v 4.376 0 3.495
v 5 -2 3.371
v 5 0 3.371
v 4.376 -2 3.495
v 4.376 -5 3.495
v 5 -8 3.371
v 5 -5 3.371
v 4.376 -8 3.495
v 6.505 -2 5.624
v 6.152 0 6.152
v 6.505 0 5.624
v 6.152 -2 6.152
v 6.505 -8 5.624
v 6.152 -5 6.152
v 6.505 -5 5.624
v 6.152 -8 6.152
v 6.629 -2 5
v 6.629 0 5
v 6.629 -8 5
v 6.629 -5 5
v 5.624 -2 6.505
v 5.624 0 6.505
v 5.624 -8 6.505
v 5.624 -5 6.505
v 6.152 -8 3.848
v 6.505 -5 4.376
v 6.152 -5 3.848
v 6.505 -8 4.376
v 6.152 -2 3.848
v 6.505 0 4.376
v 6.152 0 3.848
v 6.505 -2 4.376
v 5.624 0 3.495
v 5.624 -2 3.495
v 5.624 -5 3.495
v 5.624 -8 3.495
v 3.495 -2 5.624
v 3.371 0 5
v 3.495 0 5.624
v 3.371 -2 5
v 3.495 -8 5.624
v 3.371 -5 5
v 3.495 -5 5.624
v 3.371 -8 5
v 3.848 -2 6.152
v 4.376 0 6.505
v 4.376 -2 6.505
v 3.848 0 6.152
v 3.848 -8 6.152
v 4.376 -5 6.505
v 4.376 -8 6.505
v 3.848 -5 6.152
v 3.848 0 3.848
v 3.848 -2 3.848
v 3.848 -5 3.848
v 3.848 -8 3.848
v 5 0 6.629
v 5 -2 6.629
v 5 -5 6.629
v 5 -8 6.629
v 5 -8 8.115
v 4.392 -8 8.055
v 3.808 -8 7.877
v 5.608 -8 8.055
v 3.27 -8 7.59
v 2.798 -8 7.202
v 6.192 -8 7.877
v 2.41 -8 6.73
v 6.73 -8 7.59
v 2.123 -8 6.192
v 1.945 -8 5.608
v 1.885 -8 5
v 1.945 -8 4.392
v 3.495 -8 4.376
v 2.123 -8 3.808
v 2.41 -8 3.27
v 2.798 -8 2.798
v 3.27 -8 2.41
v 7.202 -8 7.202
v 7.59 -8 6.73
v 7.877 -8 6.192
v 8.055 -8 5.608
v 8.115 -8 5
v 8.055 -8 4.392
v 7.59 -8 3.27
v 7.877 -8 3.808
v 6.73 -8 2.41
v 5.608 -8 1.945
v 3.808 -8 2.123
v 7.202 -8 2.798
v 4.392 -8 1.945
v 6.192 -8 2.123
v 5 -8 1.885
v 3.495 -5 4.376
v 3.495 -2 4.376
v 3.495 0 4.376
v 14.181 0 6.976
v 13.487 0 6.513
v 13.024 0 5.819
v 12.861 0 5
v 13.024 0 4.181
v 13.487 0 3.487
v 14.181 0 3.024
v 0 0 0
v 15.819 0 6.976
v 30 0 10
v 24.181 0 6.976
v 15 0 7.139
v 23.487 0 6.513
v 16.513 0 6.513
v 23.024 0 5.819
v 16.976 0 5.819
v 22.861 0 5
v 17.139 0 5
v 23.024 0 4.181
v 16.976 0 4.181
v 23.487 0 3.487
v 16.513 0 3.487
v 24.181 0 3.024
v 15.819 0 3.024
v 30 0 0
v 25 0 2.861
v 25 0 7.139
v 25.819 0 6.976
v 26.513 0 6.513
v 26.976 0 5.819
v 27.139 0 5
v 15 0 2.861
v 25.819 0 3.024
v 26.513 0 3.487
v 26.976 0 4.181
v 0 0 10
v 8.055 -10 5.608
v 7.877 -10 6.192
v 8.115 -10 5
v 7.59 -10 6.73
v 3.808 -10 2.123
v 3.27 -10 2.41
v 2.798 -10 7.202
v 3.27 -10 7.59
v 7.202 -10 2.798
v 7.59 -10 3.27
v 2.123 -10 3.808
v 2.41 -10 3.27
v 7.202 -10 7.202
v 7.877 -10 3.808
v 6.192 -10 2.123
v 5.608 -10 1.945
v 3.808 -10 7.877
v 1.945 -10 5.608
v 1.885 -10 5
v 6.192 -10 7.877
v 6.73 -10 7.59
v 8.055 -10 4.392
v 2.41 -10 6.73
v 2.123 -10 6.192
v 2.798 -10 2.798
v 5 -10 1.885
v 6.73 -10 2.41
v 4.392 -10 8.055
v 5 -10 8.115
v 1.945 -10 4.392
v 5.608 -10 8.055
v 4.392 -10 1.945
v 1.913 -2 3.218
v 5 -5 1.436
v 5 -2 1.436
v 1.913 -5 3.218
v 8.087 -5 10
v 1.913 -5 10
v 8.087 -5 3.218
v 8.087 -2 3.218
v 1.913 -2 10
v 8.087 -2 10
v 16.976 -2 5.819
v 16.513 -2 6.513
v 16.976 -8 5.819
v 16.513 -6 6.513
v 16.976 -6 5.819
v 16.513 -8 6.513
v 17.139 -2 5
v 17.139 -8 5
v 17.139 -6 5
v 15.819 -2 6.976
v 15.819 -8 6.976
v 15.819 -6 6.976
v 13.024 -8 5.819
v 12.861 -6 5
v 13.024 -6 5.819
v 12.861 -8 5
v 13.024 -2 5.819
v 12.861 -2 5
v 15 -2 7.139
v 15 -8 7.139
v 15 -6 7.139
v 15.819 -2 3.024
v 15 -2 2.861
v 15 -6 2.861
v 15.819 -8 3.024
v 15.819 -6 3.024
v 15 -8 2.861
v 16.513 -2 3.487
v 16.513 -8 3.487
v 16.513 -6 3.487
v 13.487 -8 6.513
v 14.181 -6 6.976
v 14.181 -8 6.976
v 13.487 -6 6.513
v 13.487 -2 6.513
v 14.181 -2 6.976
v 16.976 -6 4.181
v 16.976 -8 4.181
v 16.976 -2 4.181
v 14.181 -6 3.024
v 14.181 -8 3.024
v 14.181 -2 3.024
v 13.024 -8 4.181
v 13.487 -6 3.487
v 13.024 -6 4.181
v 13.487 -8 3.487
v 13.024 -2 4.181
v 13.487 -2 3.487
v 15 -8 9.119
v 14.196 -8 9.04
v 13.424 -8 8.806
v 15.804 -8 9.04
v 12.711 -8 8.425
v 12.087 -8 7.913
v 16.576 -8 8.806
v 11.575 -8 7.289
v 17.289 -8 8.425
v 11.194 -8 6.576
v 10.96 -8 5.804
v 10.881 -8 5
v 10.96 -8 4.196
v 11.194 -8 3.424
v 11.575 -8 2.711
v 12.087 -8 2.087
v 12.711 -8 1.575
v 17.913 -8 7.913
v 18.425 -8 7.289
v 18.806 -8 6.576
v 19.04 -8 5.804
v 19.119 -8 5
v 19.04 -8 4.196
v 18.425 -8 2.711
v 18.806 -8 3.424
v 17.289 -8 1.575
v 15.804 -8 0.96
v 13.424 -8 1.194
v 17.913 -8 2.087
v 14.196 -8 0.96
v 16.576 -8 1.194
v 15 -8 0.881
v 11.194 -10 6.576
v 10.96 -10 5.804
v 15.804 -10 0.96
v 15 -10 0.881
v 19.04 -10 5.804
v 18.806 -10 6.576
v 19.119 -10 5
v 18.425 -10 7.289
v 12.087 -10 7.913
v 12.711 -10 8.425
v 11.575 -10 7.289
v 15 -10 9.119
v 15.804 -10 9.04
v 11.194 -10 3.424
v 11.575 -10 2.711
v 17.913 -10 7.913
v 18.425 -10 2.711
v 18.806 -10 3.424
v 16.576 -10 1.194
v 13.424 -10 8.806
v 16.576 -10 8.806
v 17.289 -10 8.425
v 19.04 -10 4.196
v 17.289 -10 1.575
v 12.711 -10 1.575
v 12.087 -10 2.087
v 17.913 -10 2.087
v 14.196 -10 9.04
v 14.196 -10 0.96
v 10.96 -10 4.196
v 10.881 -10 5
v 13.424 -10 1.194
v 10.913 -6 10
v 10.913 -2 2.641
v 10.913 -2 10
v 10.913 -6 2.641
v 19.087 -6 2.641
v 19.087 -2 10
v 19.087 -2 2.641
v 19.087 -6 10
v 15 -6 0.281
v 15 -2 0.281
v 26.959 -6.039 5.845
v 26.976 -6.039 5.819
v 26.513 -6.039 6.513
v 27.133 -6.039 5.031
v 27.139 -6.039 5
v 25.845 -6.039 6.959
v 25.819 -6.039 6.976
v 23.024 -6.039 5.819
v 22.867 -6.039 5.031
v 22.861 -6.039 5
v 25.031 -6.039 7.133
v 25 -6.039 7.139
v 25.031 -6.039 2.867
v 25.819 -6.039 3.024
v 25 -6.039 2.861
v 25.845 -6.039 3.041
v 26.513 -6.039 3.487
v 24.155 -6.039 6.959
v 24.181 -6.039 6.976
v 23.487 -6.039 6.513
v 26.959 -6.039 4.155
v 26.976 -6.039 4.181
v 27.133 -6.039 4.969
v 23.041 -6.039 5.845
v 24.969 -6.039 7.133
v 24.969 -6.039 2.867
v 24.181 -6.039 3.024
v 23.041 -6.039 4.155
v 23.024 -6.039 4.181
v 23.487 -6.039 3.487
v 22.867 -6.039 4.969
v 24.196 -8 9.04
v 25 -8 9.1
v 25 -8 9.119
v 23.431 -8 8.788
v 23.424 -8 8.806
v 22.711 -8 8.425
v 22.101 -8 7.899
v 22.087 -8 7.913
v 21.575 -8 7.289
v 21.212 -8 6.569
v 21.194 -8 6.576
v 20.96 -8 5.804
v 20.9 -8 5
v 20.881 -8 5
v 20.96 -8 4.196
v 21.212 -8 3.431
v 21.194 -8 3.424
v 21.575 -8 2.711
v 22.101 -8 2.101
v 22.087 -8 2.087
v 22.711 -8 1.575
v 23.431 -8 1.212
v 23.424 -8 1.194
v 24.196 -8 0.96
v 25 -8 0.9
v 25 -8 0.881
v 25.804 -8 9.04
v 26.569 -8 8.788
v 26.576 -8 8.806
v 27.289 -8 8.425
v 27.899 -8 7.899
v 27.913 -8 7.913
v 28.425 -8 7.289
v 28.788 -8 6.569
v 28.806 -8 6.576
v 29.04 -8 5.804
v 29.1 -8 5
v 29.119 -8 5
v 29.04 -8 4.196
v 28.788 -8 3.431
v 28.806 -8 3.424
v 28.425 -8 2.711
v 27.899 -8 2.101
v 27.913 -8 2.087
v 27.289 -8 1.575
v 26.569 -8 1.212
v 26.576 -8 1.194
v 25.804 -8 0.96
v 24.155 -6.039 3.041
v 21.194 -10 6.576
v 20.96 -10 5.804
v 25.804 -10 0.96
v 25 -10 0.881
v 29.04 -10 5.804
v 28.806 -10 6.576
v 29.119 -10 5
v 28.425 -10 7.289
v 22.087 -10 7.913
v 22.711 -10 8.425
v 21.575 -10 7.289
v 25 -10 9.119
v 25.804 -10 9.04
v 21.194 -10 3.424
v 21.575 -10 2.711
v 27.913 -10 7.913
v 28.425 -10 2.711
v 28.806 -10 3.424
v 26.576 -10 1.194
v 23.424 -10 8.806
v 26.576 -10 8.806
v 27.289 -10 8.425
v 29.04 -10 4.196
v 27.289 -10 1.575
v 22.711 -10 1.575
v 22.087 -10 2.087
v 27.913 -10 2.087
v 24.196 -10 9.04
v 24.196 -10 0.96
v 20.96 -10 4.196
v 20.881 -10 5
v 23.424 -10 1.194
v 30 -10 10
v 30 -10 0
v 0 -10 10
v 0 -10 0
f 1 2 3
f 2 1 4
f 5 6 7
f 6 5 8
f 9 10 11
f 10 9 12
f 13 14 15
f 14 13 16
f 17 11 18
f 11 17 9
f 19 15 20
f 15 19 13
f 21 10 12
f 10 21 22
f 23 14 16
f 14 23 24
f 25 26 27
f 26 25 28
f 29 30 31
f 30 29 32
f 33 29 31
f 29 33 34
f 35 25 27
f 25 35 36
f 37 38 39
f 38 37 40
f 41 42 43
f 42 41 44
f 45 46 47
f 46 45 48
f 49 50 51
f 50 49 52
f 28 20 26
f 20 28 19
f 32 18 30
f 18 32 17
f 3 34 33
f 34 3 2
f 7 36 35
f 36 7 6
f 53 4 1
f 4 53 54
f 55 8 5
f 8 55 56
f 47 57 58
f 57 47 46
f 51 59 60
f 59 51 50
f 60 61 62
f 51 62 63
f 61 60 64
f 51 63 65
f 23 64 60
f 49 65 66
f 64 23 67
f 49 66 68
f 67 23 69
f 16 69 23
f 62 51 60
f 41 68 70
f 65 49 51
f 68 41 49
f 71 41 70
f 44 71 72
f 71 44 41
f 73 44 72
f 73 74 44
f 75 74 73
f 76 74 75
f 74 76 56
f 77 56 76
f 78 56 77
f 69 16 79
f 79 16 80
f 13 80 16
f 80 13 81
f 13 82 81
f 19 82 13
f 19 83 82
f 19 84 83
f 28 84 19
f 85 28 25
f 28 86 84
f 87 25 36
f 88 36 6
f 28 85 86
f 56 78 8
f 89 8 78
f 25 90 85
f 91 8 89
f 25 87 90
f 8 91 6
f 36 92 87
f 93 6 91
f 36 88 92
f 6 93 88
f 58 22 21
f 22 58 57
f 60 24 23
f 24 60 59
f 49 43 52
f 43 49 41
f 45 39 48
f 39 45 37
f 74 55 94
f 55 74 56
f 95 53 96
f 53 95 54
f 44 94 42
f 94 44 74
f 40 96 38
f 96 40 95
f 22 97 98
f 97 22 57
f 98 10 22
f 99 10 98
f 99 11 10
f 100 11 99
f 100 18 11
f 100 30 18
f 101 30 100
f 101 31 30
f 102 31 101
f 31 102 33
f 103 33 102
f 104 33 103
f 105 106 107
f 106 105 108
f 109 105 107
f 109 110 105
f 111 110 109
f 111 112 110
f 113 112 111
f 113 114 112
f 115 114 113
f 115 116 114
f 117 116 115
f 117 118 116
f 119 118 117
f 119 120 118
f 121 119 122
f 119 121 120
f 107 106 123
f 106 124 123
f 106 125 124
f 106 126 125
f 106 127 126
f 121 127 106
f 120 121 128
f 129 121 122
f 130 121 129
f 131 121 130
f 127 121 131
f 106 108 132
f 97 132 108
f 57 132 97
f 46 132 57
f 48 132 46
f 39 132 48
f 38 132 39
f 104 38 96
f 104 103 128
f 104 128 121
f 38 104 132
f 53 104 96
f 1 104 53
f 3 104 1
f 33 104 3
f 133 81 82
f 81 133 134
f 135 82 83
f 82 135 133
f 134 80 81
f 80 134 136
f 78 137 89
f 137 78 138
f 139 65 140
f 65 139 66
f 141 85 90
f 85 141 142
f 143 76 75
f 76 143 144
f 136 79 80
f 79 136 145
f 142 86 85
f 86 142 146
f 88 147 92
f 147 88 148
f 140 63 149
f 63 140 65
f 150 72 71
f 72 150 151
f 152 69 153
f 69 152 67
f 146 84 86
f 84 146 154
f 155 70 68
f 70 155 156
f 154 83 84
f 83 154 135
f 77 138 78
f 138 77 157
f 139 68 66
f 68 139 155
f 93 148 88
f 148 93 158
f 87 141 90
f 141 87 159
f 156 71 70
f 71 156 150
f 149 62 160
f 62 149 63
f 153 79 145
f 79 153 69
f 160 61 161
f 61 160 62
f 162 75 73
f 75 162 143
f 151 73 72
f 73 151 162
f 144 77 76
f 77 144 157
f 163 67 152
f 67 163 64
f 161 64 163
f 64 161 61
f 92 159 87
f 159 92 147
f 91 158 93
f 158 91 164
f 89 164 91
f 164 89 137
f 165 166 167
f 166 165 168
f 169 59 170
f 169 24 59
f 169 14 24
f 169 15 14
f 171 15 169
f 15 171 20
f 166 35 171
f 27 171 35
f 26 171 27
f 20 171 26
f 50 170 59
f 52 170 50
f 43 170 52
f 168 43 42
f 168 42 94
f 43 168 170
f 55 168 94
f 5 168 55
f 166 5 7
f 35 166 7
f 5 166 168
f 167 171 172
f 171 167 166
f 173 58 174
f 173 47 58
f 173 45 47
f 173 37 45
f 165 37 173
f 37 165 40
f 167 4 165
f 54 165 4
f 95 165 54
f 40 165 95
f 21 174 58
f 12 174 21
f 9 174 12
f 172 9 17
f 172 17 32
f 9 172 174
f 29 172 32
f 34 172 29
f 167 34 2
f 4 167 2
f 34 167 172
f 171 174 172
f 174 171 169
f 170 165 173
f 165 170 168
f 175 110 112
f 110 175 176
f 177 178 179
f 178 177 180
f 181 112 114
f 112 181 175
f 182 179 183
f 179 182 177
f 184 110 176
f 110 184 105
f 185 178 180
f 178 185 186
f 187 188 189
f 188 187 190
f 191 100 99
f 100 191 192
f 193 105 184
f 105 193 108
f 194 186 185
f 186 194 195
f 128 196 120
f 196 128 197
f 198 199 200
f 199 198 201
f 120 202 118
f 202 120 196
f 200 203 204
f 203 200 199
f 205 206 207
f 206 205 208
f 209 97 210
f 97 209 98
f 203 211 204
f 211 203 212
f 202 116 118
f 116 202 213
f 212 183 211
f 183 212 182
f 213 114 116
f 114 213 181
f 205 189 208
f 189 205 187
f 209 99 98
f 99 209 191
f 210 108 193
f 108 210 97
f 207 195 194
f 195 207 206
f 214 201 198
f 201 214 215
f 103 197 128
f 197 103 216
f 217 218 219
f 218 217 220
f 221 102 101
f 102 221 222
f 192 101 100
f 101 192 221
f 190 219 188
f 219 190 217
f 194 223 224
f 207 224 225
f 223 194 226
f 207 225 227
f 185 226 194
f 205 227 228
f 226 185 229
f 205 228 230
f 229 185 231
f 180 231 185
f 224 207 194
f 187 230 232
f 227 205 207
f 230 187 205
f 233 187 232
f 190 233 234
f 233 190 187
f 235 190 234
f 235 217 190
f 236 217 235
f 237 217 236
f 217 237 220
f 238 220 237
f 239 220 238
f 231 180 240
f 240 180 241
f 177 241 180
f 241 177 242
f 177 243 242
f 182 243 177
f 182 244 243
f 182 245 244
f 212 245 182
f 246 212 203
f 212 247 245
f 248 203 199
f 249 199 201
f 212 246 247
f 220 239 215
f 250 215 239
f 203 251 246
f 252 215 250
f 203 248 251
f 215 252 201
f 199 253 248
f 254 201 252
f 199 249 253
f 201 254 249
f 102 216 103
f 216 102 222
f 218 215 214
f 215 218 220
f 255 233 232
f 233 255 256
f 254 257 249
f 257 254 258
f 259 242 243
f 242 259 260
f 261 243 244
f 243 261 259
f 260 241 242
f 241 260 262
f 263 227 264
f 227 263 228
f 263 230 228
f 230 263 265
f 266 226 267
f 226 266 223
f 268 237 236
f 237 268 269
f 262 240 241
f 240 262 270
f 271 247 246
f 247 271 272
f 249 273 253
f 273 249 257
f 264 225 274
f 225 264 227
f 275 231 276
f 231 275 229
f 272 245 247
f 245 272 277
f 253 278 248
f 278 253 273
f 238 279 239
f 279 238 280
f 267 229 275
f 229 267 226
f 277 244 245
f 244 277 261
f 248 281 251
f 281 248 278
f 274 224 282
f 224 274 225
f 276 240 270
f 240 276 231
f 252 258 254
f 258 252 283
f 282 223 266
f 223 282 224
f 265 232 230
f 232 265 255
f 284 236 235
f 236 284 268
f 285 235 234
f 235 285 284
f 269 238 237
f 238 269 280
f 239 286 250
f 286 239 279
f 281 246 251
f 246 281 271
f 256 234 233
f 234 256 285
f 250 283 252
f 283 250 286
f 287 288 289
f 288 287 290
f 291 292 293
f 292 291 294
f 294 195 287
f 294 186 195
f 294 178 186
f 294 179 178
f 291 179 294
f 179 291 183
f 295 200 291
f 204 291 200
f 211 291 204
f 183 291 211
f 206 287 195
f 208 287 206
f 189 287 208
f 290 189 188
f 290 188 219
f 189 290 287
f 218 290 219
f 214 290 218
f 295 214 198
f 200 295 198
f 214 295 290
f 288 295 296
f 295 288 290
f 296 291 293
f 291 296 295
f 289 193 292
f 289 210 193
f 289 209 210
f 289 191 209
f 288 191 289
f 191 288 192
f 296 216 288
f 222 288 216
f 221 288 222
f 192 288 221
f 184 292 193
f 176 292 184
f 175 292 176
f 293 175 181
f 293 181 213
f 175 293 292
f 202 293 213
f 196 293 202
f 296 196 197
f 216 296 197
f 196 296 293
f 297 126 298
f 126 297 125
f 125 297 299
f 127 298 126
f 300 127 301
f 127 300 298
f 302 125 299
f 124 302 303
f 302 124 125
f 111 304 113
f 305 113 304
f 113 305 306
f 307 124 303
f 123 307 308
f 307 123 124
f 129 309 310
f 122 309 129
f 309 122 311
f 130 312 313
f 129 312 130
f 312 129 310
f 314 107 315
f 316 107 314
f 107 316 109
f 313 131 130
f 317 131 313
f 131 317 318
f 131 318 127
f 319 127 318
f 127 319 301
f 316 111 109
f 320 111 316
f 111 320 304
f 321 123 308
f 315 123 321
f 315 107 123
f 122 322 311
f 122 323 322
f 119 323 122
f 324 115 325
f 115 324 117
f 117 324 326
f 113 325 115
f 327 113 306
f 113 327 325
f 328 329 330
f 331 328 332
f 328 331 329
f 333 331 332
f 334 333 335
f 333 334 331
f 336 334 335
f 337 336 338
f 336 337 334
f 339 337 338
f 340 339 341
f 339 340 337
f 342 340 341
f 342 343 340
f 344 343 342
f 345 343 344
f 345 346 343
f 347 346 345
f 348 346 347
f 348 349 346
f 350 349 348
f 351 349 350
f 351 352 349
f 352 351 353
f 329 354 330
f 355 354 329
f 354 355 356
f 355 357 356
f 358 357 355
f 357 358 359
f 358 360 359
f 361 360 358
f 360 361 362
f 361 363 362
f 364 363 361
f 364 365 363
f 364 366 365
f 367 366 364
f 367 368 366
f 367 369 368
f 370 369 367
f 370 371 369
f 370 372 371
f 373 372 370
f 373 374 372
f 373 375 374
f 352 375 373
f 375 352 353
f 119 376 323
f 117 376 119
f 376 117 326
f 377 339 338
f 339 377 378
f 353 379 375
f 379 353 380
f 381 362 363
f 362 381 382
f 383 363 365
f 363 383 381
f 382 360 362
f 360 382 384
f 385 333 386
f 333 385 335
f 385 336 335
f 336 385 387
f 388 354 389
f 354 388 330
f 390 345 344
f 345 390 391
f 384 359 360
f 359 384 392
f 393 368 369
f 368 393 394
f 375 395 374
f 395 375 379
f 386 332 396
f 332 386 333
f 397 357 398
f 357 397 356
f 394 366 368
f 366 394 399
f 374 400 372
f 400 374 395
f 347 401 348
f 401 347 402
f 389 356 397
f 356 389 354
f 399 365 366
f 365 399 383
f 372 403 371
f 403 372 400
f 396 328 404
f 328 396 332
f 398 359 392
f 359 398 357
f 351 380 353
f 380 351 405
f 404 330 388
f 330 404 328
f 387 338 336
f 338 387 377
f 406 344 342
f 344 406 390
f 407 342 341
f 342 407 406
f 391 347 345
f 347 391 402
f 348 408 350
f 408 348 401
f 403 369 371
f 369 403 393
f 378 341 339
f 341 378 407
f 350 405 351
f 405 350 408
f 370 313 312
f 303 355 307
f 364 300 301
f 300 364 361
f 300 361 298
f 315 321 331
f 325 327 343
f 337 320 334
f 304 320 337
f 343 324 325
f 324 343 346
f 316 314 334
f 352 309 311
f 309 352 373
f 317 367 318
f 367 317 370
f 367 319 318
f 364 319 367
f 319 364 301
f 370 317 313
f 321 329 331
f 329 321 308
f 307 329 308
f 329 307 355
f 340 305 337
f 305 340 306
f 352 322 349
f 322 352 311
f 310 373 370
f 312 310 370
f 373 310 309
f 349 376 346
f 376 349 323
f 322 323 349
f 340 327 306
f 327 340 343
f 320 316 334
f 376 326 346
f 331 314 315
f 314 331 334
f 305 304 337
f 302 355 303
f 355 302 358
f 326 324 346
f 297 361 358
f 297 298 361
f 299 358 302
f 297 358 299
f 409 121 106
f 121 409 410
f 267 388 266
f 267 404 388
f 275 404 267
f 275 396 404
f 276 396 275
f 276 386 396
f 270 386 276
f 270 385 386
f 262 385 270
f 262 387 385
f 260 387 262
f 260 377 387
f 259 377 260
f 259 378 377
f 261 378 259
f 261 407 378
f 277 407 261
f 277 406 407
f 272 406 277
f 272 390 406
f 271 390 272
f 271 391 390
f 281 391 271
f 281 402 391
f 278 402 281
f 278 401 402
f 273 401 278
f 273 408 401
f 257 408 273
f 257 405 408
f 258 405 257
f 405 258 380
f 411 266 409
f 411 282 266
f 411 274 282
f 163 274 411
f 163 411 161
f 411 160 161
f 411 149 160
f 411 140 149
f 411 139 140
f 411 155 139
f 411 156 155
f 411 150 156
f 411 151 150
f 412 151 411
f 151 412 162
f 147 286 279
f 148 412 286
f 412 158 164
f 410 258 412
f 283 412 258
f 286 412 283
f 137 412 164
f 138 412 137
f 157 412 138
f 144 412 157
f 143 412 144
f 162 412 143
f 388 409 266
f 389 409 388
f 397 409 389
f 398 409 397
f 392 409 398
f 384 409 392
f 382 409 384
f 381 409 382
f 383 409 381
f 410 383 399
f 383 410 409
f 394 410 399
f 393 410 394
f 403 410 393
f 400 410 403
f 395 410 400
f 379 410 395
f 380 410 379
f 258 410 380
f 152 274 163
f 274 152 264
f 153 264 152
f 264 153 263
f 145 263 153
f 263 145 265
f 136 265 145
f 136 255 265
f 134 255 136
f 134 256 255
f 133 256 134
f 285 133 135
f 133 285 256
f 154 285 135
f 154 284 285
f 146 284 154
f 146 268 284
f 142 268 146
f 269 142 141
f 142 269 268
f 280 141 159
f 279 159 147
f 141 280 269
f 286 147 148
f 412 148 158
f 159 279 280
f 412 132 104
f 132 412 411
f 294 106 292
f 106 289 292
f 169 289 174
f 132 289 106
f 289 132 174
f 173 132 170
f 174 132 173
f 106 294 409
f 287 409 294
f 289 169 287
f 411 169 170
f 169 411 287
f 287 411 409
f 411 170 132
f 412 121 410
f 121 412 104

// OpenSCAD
$radial_error = 0.1;
$fn = 16;

// This is for making holes.
module cylinder_outer(height, radius, fn=$fn) {
	fudge = 1/cos(180/fn);
	cylinder(h=height,r=radius*fudge+$radial_error, $fn=fn);
}

// This is for making things that fit in holes.
module cylinder_inner(height, radius, fn=$fn) {
	cylinder(h=height,r=radius-$radial_error,$fn=fn);
}

// Make a hole for a bolt/screw combination.
module bolt(diameter=3, depth=8, nut_offset=2, shaft_length=10, inset=10) {
	hole(diameter, depth, inset);
	hull() {
		shaft_width = diameter;
		translate([0, 0, nut_offset]) rotate(360/12, [0, 0, 1]) cylinder_outer(diameter, shaft_width, 6);
		translate([0, shaft_length, nut_offset]) rotate(360/12, [0, 0, 1]) cylinder_outer(diameter, shaft_width, 6);
	}
}

// Make a hole. The diameter is the size of the screw (e.g. 3 for M3). Depth is how far the hole should go for the thread, and inset is how far out there should be a hole for the head to go.
module hole(diameter=3, depth=6, inset=10) {
	cylinder_outer(depth, diameter/2);
	translate([0, 0, depth]) cylinder_outer(inset, diameter, 32);
}

module countersunk_hole(diameter=3, depth=6, inset=10) {
	hole(diameter, depth, inset);
	translate([0, 0, depth-diameter/2]) cylinder(r1=diameter/2+$radial_error, r2=diameter+$radial_error, h=diameter/2);
}

module mounting_hole(diameter=3, depth=6, inset=10, outset=3) {
	difference() {
		cylinder_outer(depth, diameter/2+outset);
		hole(diameter=diameter, depth=depth, inset=inset);
	}
}

rotate(90, [1, 0, 0]) difference() {
	cube([30, 10, 10]);
	translate([5, 5, 0]) bolt(diameter=3, depth=8);
	translate([15, 5, 0]) bolt(diameter=4, depth=8);
	translate([25, 5, 0]) countersunk_hole(diameter=4, depth=8);
}
